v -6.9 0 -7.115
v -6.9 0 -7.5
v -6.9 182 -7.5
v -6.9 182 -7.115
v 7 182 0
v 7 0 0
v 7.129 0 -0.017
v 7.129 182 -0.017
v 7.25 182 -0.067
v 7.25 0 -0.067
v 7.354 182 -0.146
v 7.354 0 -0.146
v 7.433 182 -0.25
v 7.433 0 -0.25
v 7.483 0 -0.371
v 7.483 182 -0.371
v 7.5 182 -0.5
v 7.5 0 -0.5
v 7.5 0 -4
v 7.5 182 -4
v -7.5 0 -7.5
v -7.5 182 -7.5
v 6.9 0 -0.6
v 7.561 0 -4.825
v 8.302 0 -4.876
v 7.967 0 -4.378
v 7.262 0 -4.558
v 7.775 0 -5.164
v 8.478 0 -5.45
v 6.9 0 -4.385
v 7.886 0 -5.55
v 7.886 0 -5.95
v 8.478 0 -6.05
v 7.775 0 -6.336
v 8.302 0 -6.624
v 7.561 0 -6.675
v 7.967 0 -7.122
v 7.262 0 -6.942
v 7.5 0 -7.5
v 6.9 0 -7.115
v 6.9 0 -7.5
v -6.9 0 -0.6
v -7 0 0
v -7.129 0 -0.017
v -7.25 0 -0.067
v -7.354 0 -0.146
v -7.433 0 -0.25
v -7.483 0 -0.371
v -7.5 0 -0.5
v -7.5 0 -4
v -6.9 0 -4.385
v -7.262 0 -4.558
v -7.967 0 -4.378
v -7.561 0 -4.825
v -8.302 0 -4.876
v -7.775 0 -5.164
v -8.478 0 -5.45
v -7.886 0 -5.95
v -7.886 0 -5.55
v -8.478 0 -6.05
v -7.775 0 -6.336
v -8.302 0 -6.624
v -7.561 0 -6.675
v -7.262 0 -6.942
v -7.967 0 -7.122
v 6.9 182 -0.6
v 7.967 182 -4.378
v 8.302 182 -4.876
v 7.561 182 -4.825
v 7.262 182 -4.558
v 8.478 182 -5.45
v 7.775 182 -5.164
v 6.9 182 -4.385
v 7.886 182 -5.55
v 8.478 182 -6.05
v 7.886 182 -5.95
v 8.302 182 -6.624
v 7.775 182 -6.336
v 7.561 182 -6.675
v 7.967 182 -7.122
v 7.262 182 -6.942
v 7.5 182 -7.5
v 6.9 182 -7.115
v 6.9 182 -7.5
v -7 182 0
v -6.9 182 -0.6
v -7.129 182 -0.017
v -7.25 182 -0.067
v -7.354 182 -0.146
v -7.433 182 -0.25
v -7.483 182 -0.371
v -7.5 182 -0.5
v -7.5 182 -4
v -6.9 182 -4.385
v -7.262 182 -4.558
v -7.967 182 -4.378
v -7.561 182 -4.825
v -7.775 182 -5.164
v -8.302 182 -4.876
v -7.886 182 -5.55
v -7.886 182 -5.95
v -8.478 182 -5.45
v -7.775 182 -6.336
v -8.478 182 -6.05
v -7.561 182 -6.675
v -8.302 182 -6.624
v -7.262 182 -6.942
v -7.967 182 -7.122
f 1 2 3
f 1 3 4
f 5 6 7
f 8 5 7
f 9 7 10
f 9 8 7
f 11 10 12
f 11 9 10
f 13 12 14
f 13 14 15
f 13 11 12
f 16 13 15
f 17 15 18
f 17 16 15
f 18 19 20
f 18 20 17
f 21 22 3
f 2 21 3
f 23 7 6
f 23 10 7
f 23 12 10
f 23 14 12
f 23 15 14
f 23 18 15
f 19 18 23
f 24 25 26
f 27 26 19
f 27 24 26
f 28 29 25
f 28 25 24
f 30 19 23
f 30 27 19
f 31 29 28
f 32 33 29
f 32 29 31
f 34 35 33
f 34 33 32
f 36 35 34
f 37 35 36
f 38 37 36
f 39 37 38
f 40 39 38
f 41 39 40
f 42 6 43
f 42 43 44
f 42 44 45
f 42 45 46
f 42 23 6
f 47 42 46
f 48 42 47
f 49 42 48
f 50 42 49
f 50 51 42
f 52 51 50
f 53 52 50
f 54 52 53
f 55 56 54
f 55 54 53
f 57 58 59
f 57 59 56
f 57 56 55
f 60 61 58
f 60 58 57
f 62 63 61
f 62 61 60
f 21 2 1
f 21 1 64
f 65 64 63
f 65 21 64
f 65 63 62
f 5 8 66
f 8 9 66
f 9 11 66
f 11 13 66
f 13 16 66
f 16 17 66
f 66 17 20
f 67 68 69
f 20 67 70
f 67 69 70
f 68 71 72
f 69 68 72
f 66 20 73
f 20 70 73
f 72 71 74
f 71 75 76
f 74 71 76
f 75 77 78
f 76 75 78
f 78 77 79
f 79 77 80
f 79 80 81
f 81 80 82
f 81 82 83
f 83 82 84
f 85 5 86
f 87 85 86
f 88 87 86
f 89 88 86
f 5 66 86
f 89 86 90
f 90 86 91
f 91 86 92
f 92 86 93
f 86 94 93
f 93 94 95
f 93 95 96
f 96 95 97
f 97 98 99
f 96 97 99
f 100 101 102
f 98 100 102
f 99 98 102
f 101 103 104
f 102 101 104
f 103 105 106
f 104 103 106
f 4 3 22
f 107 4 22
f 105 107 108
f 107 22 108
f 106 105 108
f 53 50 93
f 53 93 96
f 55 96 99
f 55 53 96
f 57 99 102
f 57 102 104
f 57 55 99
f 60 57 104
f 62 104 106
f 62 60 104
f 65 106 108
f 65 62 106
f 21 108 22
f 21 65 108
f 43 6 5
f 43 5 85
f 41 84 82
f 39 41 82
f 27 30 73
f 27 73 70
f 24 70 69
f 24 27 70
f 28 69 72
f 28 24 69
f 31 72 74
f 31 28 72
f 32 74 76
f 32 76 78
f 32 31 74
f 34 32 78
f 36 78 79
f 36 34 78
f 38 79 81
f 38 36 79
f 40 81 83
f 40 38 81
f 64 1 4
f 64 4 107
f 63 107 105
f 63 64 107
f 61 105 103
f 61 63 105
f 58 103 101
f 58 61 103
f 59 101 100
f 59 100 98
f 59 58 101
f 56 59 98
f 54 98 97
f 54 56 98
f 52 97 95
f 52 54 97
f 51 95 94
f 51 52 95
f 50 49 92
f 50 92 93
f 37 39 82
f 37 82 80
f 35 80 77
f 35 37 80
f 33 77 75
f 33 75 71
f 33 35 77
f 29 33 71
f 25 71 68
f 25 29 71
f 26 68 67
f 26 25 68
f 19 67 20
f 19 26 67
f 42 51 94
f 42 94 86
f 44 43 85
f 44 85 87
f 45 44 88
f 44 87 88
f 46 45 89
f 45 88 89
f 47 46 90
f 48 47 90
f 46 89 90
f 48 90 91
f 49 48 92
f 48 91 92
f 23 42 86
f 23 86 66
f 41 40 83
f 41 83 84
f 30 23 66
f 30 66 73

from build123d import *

# Parameters (mm, degrees)
EXTRUSION1_DEPTH = 182
CONG_1_R         = 0.5


with BuildPart() as part:
    # Esquisse1 → Extrusion1 (new body)
    with BuildSketch(Plane(origin=(0, 0, 0), x_dir=(1, 0, 0), z_dir=(0, 1, 0))):
        with BuildLine():
            Line((7.5, 0), (-7.5, 0))
            Line((-7.5, 0), (-7.5, 4))
            ThreePointArc((-7.5, 4), (-8.5, 5.75), (-7.5, 7.5))
            Line((-7.5, 7.5), (-6.9, 7.5))
            Line((-6.9, 7.5), (-6.9, 7.114734406))
            ThreePointArc((-6.9, 7.114734406), (-7.9, 5.75), (-6.9, 4.385265594))
            Line((-6.9, 4.385265594), (-6.9, 0.6))
            Line((-6.9, 0.6), (6.9, 0.6))
            Line((6.9, 0.6), (6.9, 4.385265594))
            ThreePointArc((6.9, 4.385265594), (7.9, 5.75), (6.9, 7.114734406))
            Line((6.9, 7.114734406), (6.9, 7.5))
            Line((6.9, 7.5), (7.5, 7.5))
            ThreePointArc((7.5, 7.5), (8.5, 5.75), (7.5, 4))
            Line((7.5, 4), (7.5, 0))
        make_face()
    extrude(amount=EXTRUSION1_DEPTH)

    # Congé1
    cong_1_edges = [part.edges().sort_by_distance(p)[0] for p in [
        (7.5, 91, 0),
        (-7.5, 91, 0),
    ]]
    fillet(cong_1_edges, radius=CONG_1_R)


solid = part.part
